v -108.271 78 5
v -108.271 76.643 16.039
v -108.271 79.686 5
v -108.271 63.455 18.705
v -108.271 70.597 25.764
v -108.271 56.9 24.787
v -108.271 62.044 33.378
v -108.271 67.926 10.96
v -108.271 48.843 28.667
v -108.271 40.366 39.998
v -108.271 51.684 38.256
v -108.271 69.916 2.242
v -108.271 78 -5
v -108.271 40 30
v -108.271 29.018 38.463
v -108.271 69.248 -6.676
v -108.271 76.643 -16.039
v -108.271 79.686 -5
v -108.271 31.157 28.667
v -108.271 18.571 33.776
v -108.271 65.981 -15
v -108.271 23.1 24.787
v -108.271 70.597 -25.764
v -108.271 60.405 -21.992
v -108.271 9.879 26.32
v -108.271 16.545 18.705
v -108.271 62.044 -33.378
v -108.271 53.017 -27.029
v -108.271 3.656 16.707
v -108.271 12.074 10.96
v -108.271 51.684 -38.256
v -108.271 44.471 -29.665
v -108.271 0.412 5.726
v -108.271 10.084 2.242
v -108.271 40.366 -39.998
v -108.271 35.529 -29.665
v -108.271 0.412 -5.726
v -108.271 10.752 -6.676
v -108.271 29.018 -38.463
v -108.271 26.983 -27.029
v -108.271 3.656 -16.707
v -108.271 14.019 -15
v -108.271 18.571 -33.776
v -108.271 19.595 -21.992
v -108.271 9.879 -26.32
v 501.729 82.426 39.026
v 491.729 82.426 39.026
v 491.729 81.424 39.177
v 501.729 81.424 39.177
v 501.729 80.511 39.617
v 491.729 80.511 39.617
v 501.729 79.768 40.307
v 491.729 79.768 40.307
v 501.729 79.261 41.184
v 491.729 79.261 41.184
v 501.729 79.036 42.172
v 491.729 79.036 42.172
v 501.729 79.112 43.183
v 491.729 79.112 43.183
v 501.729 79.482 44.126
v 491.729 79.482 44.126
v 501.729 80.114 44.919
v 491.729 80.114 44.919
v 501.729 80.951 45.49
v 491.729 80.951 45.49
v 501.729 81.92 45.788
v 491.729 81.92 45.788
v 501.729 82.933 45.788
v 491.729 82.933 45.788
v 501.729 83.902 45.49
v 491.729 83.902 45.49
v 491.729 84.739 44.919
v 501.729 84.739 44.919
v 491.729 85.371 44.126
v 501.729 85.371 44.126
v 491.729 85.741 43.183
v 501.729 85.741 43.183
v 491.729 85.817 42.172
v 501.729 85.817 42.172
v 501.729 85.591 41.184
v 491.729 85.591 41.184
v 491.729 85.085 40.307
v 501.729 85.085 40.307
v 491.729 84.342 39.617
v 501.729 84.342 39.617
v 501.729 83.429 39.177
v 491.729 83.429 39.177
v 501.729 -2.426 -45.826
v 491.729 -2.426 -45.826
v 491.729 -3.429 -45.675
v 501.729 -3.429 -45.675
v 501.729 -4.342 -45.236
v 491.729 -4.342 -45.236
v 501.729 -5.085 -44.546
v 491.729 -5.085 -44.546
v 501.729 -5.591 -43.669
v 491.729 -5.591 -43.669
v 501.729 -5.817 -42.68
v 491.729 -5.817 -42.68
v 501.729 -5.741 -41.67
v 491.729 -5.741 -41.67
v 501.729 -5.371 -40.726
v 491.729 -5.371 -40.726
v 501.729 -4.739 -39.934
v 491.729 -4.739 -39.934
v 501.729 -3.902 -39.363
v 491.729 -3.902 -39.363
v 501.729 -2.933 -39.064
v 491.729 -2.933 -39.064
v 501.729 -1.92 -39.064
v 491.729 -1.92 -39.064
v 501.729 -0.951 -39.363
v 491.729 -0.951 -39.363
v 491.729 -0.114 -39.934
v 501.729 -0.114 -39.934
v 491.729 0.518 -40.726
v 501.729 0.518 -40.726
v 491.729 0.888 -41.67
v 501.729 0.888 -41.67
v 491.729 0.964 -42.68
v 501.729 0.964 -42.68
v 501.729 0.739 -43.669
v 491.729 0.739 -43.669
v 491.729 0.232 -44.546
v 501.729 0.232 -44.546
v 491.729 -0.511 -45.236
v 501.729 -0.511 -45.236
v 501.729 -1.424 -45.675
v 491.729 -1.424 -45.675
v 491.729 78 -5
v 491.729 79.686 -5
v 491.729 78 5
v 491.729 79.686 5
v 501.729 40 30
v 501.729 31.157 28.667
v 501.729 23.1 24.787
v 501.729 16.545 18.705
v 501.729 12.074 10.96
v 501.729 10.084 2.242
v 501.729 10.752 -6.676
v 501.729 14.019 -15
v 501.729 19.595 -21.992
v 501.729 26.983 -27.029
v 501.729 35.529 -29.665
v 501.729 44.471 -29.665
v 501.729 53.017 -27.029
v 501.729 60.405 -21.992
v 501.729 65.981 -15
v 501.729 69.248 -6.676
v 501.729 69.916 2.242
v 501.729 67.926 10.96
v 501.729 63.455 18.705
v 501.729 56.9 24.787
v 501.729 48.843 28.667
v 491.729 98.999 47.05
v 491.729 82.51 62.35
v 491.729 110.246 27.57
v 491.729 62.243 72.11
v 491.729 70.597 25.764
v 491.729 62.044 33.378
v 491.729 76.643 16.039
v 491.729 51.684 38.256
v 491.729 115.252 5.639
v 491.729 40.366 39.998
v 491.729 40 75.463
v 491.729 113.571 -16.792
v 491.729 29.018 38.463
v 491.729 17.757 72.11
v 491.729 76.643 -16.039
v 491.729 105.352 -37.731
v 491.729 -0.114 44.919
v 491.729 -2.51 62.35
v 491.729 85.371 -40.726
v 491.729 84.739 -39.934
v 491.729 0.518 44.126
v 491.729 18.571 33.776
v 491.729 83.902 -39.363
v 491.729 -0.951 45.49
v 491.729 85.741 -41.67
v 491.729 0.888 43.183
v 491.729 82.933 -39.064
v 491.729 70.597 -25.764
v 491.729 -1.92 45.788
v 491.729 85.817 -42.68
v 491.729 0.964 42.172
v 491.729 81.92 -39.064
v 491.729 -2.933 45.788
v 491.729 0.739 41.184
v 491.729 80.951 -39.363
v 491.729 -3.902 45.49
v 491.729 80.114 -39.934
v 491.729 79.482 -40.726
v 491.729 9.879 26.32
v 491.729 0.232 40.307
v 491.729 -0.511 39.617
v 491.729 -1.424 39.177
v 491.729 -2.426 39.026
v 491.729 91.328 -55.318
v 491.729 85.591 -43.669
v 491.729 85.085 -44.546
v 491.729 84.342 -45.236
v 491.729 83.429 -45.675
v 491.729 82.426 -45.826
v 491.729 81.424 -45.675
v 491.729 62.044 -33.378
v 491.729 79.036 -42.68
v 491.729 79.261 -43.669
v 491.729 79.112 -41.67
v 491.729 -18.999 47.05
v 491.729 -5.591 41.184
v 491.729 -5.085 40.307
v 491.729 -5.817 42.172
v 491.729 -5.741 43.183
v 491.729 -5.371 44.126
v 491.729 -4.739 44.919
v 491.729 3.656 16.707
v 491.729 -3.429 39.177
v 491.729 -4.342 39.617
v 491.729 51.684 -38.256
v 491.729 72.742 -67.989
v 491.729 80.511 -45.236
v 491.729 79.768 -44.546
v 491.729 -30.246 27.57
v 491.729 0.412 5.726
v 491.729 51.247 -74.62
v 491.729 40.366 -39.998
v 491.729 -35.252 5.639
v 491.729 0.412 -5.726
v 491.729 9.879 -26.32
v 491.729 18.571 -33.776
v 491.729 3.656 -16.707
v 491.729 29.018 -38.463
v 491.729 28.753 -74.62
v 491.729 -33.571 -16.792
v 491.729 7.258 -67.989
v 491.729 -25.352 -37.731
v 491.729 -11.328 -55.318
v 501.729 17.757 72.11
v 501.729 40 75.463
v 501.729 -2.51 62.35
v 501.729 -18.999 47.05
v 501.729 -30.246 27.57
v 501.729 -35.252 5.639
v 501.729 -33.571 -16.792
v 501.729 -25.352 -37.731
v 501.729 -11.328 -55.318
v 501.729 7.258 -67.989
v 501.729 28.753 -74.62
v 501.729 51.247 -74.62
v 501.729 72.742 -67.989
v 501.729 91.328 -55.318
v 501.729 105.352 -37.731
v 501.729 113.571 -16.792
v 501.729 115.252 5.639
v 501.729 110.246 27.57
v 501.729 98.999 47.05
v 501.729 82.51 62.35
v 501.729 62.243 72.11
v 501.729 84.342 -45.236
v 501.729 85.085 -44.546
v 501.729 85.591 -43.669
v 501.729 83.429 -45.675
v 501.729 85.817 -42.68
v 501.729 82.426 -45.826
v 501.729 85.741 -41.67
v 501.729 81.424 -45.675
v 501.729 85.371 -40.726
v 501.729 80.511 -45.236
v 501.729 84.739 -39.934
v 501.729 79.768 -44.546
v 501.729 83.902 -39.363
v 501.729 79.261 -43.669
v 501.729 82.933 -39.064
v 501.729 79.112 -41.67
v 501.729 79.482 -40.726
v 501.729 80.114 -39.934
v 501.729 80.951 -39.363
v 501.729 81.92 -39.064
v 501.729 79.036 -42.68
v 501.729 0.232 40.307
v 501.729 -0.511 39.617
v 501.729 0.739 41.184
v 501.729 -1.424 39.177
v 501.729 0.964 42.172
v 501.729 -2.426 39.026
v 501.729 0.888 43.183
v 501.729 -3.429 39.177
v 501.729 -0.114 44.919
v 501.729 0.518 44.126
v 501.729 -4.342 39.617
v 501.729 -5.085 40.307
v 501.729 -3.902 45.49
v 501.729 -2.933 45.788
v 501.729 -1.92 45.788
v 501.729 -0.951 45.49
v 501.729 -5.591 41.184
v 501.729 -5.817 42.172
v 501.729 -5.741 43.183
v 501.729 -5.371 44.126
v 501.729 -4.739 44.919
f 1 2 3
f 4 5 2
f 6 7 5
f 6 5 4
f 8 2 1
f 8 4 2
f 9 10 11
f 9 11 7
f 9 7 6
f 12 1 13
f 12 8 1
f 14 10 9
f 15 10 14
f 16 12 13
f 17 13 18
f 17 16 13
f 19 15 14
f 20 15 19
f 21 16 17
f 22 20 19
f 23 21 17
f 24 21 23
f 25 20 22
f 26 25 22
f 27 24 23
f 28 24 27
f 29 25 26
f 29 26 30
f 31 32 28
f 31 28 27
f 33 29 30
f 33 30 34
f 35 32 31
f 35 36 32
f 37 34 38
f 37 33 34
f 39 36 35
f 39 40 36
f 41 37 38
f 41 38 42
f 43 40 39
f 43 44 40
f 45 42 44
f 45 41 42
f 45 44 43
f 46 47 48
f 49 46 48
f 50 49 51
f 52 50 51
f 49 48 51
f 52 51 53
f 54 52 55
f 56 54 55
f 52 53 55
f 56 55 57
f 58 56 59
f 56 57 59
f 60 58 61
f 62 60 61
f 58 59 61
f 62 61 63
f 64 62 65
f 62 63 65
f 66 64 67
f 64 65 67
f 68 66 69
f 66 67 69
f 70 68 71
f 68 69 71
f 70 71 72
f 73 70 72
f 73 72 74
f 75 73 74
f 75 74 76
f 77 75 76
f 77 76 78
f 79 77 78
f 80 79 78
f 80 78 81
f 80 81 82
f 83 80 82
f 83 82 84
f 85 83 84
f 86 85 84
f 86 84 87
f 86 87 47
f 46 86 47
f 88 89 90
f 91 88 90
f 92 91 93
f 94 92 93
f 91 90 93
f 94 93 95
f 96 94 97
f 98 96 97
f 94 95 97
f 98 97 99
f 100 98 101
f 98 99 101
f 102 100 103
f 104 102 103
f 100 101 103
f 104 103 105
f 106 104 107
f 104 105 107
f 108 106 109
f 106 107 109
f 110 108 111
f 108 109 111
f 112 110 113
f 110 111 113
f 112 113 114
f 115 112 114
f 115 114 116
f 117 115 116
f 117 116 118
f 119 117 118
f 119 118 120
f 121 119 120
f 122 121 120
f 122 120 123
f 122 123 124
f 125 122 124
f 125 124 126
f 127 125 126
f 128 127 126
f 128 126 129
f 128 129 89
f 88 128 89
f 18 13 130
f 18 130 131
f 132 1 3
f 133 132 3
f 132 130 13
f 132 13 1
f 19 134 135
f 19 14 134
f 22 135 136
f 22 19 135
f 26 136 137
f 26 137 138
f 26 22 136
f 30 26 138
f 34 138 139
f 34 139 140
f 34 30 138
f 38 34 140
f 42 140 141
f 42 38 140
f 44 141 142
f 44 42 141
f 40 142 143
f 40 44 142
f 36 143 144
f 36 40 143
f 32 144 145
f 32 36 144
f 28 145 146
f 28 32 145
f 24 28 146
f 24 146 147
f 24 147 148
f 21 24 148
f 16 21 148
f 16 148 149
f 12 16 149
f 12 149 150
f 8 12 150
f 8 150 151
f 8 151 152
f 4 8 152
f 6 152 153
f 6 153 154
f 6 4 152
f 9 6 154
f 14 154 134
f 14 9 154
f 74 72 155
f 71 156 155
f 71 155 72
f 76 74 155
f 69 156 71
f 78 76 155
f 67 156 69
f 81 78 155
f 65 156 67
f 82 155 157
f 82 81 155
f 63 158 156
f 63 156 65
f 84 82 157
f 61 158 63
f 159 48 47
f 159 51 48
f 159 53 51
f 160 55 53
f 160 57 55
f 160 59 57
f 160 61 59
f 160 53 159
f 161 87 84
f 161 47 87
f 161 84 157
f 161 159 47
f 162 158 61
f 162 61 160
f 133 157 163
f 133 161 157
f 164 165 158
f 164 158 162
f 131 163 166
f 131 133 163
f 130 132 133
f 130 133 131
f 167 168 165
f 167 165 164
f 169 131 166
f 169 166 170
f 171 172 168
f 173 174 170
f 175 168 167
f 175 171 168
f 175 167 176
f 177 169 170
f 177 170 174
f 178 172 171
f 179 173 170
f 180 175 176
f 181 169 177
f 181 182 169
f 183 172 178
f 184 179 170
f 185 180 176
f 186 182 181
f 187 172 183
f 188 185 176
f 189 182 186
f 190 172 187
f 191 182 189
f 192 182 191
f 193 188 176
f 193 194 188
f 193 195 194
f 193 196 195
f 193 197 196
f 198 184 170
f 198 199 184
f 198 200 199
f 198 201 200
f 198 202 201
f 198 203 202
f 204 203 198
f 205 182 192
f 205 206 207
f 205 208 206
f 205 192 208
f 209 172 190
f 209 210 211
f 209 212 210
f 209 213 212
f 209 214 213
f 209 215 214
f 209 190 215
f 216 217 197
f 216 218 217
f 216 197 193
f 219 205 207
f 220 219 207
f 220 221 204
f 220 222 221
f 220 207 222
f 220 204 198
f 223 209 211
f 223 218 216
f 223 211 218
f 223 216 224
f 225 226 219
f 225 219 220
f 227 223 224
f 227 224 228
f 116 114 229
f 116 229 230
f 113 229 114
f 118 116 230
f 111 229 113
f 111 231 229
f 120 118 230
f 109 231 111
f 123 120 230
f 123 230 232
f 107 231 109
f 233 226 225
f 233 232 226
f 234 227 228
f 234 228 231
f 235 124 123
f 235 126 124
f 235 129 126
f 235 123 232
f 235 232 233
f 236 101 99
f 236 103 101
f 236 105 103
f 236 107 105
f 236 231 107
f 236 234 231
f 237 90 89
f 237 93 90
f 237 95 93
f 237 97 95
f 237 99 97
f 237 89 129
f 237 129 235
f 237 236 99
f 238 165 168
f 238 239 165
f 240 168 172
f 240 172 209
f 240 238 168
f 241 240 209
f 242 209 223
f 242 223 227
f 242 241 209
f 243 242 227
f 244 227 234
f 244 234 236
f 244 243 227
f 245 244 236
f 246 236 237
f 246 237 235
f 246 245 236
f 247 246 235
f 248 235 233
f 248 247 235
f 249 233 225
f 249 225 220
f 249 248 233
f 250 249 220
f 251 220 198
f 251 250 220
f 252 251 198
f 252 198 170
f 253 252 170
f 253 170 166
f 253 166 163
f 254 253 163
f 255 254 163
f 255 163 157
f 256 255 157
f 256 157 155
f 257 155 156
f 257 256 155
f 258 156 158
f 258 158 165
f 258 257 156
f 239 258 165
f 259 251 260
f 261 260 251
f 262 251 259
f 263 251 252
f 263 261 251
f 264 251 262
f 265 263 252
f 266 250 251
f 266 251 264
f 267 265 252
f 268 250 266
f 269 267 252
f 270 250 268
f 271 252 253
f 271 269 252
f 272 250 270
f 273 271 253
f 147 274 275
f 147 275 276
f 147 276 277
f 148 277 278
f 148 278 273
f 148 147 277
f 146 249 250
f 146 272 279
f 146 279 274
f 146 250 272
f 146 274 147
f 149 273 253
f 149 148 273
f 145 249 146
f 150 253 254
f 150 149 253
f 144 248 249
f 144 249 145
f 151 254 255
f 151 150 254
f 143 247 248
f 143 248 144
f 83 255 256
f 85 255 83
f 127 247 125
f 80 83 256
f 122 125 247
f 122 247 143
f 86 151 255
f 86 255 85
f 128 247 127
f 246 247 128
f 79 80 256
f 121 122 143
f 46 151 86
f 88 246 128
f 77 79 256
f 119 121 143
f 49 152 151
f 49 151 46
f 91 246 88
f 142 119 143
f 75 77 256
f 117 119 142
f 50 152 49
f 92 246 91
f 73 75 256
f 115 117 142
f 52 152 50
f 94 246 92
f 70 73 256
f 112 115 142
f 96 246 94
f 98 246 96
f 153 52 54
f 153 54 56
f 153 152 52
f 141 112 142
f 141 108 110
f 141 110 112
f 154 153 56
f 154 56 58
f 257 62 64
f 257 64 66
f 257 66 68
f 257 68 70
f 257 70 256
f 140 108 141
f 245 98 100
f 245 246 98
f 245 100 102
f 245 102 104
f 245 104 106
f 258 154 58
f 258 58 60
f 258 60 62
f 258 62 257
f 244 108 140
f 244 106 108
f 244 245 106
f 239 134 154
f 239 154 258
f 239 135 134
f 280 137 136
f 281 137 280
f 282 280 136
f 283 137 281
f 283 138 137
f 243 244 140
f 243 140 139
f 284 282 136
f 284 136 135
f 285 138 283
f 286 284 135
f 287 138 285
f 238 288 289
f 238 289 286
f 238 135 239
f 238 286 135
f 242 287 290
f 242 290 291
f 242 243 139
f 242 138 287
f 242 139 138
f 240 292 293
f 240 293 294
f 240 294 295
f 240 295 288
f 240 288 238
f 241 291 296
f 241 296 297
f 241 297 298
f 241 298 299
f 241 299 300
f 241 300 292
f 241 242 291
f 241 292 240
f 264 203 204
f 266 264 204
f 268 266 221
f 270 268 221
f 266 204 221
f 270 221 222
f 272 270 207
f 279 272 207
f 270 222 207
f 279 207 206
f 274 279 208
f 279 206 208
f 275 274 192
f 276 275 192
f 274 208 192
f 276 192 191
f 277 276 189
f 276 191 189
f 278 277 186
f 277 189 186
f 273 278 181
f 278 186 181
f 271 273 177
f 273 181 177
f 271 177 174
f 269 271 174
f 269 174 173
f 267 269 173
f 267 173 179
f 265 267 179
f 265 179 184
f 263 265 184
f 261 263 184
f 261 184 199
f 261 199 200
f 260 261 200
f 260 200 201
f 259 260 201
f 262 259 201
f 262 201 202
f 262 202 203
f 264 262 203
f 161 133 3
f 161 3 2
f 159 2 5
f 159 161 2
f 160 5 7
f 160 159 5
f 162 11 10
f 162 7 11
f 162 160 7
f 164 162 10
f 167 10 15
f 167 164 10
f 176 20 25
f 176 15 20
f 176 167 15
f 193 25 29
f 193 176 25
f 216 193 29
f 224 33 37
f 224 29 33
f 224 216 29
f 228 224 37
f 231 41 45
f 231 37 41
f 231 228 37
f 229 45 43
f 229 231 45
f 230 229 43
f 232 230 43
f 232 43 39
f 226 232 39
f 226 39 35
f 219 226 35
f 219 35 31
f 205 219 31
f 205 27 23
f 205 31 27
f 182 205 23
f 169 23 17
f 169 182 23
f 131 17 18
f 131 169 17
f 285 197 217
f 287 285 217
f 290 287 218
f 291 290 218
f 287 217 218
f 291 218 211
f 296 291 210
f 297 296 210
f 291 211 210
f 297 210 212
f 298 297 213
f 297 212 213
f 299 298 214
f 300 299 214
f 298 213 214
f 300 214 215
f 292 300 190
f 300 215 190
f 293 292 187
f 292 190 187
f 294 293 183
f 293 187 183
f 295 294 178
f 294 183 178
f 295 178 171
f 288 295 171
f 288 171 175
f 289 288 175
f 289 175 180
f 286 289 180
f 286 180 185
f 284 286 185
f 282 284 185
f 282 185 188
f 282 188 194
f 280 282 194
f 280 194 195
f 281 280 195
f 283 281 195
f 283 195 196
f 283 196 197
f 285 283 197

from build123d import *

# Parameters (mm, degrees)
SKETCH2_W             = 10
SKETCH2_H             = 4
EXTRUDE1_DEPTH        = 600
M8_TAPPED_HOLE1_D     = 6.8
M8_TAPPED_HOLE1_DEPTH = 19.75
M8_TAPPED_HOLE1_TIP   = 2.042926105


with BuildPart() as part:
    # Sketch1 → Revolve1 (revolve)
    with BuildSketch(Plane.XY, mode=Mode.PRIVATE) as revolve1_sk:
        Polygon((-108.27123445, 10), (-108.27123445, 0), (491.72876555, 0), (491.72876555, -35.462555066), (501.72876555, -35.462555066), (501.72876555, 10), align=None)
    revolve(revolve1_sk.sketch.rotate(Axis((-148.45814978, 40, 0), (1, 0, 0)), 270), axis=Axis((-148.45814978, 40, 0), (1, 0, 0)))

    # Sketch2 → Extrude1 (cut)
    with BuildSketch(Plane.ZY.offset(108.27123445)):
        with Locations((0, 80)):
            Rectangle(SKETCH2_W, SKETCH2_H)
    extrude(amount=-EXTRUDE1_DEPTH, mode=Mode.SUBTRACT)

    # M8 Tapped Hole1
    with Locations(Plane(origin=(501.72876555, 82.426406871, 42.426406871), x_dir=(0, 0, 1), z_dir=(1, 0, 0))):
        with Locations((0, 0), (-84.852813742, 0), (-84.852813742, 84.852813742), (0, 84.852813742)):
            Hole(M8_TAPPED_HOLE1_D / 2, depth=M8_TAPPED_HOLE1_DEPTH)
            with Locations((0, 0, -(M8_TAPPED_HOLE1_DEPTH + M8_TAPPED_HOLE1_TIP / 2))):  # 118° drill point
                Cone(0, M8_TAPPED_HOLE1_D / 2, M8_TAPPED_HOLE1_TIP, mode=Mode.SUBTRACT)


solid = part.part
